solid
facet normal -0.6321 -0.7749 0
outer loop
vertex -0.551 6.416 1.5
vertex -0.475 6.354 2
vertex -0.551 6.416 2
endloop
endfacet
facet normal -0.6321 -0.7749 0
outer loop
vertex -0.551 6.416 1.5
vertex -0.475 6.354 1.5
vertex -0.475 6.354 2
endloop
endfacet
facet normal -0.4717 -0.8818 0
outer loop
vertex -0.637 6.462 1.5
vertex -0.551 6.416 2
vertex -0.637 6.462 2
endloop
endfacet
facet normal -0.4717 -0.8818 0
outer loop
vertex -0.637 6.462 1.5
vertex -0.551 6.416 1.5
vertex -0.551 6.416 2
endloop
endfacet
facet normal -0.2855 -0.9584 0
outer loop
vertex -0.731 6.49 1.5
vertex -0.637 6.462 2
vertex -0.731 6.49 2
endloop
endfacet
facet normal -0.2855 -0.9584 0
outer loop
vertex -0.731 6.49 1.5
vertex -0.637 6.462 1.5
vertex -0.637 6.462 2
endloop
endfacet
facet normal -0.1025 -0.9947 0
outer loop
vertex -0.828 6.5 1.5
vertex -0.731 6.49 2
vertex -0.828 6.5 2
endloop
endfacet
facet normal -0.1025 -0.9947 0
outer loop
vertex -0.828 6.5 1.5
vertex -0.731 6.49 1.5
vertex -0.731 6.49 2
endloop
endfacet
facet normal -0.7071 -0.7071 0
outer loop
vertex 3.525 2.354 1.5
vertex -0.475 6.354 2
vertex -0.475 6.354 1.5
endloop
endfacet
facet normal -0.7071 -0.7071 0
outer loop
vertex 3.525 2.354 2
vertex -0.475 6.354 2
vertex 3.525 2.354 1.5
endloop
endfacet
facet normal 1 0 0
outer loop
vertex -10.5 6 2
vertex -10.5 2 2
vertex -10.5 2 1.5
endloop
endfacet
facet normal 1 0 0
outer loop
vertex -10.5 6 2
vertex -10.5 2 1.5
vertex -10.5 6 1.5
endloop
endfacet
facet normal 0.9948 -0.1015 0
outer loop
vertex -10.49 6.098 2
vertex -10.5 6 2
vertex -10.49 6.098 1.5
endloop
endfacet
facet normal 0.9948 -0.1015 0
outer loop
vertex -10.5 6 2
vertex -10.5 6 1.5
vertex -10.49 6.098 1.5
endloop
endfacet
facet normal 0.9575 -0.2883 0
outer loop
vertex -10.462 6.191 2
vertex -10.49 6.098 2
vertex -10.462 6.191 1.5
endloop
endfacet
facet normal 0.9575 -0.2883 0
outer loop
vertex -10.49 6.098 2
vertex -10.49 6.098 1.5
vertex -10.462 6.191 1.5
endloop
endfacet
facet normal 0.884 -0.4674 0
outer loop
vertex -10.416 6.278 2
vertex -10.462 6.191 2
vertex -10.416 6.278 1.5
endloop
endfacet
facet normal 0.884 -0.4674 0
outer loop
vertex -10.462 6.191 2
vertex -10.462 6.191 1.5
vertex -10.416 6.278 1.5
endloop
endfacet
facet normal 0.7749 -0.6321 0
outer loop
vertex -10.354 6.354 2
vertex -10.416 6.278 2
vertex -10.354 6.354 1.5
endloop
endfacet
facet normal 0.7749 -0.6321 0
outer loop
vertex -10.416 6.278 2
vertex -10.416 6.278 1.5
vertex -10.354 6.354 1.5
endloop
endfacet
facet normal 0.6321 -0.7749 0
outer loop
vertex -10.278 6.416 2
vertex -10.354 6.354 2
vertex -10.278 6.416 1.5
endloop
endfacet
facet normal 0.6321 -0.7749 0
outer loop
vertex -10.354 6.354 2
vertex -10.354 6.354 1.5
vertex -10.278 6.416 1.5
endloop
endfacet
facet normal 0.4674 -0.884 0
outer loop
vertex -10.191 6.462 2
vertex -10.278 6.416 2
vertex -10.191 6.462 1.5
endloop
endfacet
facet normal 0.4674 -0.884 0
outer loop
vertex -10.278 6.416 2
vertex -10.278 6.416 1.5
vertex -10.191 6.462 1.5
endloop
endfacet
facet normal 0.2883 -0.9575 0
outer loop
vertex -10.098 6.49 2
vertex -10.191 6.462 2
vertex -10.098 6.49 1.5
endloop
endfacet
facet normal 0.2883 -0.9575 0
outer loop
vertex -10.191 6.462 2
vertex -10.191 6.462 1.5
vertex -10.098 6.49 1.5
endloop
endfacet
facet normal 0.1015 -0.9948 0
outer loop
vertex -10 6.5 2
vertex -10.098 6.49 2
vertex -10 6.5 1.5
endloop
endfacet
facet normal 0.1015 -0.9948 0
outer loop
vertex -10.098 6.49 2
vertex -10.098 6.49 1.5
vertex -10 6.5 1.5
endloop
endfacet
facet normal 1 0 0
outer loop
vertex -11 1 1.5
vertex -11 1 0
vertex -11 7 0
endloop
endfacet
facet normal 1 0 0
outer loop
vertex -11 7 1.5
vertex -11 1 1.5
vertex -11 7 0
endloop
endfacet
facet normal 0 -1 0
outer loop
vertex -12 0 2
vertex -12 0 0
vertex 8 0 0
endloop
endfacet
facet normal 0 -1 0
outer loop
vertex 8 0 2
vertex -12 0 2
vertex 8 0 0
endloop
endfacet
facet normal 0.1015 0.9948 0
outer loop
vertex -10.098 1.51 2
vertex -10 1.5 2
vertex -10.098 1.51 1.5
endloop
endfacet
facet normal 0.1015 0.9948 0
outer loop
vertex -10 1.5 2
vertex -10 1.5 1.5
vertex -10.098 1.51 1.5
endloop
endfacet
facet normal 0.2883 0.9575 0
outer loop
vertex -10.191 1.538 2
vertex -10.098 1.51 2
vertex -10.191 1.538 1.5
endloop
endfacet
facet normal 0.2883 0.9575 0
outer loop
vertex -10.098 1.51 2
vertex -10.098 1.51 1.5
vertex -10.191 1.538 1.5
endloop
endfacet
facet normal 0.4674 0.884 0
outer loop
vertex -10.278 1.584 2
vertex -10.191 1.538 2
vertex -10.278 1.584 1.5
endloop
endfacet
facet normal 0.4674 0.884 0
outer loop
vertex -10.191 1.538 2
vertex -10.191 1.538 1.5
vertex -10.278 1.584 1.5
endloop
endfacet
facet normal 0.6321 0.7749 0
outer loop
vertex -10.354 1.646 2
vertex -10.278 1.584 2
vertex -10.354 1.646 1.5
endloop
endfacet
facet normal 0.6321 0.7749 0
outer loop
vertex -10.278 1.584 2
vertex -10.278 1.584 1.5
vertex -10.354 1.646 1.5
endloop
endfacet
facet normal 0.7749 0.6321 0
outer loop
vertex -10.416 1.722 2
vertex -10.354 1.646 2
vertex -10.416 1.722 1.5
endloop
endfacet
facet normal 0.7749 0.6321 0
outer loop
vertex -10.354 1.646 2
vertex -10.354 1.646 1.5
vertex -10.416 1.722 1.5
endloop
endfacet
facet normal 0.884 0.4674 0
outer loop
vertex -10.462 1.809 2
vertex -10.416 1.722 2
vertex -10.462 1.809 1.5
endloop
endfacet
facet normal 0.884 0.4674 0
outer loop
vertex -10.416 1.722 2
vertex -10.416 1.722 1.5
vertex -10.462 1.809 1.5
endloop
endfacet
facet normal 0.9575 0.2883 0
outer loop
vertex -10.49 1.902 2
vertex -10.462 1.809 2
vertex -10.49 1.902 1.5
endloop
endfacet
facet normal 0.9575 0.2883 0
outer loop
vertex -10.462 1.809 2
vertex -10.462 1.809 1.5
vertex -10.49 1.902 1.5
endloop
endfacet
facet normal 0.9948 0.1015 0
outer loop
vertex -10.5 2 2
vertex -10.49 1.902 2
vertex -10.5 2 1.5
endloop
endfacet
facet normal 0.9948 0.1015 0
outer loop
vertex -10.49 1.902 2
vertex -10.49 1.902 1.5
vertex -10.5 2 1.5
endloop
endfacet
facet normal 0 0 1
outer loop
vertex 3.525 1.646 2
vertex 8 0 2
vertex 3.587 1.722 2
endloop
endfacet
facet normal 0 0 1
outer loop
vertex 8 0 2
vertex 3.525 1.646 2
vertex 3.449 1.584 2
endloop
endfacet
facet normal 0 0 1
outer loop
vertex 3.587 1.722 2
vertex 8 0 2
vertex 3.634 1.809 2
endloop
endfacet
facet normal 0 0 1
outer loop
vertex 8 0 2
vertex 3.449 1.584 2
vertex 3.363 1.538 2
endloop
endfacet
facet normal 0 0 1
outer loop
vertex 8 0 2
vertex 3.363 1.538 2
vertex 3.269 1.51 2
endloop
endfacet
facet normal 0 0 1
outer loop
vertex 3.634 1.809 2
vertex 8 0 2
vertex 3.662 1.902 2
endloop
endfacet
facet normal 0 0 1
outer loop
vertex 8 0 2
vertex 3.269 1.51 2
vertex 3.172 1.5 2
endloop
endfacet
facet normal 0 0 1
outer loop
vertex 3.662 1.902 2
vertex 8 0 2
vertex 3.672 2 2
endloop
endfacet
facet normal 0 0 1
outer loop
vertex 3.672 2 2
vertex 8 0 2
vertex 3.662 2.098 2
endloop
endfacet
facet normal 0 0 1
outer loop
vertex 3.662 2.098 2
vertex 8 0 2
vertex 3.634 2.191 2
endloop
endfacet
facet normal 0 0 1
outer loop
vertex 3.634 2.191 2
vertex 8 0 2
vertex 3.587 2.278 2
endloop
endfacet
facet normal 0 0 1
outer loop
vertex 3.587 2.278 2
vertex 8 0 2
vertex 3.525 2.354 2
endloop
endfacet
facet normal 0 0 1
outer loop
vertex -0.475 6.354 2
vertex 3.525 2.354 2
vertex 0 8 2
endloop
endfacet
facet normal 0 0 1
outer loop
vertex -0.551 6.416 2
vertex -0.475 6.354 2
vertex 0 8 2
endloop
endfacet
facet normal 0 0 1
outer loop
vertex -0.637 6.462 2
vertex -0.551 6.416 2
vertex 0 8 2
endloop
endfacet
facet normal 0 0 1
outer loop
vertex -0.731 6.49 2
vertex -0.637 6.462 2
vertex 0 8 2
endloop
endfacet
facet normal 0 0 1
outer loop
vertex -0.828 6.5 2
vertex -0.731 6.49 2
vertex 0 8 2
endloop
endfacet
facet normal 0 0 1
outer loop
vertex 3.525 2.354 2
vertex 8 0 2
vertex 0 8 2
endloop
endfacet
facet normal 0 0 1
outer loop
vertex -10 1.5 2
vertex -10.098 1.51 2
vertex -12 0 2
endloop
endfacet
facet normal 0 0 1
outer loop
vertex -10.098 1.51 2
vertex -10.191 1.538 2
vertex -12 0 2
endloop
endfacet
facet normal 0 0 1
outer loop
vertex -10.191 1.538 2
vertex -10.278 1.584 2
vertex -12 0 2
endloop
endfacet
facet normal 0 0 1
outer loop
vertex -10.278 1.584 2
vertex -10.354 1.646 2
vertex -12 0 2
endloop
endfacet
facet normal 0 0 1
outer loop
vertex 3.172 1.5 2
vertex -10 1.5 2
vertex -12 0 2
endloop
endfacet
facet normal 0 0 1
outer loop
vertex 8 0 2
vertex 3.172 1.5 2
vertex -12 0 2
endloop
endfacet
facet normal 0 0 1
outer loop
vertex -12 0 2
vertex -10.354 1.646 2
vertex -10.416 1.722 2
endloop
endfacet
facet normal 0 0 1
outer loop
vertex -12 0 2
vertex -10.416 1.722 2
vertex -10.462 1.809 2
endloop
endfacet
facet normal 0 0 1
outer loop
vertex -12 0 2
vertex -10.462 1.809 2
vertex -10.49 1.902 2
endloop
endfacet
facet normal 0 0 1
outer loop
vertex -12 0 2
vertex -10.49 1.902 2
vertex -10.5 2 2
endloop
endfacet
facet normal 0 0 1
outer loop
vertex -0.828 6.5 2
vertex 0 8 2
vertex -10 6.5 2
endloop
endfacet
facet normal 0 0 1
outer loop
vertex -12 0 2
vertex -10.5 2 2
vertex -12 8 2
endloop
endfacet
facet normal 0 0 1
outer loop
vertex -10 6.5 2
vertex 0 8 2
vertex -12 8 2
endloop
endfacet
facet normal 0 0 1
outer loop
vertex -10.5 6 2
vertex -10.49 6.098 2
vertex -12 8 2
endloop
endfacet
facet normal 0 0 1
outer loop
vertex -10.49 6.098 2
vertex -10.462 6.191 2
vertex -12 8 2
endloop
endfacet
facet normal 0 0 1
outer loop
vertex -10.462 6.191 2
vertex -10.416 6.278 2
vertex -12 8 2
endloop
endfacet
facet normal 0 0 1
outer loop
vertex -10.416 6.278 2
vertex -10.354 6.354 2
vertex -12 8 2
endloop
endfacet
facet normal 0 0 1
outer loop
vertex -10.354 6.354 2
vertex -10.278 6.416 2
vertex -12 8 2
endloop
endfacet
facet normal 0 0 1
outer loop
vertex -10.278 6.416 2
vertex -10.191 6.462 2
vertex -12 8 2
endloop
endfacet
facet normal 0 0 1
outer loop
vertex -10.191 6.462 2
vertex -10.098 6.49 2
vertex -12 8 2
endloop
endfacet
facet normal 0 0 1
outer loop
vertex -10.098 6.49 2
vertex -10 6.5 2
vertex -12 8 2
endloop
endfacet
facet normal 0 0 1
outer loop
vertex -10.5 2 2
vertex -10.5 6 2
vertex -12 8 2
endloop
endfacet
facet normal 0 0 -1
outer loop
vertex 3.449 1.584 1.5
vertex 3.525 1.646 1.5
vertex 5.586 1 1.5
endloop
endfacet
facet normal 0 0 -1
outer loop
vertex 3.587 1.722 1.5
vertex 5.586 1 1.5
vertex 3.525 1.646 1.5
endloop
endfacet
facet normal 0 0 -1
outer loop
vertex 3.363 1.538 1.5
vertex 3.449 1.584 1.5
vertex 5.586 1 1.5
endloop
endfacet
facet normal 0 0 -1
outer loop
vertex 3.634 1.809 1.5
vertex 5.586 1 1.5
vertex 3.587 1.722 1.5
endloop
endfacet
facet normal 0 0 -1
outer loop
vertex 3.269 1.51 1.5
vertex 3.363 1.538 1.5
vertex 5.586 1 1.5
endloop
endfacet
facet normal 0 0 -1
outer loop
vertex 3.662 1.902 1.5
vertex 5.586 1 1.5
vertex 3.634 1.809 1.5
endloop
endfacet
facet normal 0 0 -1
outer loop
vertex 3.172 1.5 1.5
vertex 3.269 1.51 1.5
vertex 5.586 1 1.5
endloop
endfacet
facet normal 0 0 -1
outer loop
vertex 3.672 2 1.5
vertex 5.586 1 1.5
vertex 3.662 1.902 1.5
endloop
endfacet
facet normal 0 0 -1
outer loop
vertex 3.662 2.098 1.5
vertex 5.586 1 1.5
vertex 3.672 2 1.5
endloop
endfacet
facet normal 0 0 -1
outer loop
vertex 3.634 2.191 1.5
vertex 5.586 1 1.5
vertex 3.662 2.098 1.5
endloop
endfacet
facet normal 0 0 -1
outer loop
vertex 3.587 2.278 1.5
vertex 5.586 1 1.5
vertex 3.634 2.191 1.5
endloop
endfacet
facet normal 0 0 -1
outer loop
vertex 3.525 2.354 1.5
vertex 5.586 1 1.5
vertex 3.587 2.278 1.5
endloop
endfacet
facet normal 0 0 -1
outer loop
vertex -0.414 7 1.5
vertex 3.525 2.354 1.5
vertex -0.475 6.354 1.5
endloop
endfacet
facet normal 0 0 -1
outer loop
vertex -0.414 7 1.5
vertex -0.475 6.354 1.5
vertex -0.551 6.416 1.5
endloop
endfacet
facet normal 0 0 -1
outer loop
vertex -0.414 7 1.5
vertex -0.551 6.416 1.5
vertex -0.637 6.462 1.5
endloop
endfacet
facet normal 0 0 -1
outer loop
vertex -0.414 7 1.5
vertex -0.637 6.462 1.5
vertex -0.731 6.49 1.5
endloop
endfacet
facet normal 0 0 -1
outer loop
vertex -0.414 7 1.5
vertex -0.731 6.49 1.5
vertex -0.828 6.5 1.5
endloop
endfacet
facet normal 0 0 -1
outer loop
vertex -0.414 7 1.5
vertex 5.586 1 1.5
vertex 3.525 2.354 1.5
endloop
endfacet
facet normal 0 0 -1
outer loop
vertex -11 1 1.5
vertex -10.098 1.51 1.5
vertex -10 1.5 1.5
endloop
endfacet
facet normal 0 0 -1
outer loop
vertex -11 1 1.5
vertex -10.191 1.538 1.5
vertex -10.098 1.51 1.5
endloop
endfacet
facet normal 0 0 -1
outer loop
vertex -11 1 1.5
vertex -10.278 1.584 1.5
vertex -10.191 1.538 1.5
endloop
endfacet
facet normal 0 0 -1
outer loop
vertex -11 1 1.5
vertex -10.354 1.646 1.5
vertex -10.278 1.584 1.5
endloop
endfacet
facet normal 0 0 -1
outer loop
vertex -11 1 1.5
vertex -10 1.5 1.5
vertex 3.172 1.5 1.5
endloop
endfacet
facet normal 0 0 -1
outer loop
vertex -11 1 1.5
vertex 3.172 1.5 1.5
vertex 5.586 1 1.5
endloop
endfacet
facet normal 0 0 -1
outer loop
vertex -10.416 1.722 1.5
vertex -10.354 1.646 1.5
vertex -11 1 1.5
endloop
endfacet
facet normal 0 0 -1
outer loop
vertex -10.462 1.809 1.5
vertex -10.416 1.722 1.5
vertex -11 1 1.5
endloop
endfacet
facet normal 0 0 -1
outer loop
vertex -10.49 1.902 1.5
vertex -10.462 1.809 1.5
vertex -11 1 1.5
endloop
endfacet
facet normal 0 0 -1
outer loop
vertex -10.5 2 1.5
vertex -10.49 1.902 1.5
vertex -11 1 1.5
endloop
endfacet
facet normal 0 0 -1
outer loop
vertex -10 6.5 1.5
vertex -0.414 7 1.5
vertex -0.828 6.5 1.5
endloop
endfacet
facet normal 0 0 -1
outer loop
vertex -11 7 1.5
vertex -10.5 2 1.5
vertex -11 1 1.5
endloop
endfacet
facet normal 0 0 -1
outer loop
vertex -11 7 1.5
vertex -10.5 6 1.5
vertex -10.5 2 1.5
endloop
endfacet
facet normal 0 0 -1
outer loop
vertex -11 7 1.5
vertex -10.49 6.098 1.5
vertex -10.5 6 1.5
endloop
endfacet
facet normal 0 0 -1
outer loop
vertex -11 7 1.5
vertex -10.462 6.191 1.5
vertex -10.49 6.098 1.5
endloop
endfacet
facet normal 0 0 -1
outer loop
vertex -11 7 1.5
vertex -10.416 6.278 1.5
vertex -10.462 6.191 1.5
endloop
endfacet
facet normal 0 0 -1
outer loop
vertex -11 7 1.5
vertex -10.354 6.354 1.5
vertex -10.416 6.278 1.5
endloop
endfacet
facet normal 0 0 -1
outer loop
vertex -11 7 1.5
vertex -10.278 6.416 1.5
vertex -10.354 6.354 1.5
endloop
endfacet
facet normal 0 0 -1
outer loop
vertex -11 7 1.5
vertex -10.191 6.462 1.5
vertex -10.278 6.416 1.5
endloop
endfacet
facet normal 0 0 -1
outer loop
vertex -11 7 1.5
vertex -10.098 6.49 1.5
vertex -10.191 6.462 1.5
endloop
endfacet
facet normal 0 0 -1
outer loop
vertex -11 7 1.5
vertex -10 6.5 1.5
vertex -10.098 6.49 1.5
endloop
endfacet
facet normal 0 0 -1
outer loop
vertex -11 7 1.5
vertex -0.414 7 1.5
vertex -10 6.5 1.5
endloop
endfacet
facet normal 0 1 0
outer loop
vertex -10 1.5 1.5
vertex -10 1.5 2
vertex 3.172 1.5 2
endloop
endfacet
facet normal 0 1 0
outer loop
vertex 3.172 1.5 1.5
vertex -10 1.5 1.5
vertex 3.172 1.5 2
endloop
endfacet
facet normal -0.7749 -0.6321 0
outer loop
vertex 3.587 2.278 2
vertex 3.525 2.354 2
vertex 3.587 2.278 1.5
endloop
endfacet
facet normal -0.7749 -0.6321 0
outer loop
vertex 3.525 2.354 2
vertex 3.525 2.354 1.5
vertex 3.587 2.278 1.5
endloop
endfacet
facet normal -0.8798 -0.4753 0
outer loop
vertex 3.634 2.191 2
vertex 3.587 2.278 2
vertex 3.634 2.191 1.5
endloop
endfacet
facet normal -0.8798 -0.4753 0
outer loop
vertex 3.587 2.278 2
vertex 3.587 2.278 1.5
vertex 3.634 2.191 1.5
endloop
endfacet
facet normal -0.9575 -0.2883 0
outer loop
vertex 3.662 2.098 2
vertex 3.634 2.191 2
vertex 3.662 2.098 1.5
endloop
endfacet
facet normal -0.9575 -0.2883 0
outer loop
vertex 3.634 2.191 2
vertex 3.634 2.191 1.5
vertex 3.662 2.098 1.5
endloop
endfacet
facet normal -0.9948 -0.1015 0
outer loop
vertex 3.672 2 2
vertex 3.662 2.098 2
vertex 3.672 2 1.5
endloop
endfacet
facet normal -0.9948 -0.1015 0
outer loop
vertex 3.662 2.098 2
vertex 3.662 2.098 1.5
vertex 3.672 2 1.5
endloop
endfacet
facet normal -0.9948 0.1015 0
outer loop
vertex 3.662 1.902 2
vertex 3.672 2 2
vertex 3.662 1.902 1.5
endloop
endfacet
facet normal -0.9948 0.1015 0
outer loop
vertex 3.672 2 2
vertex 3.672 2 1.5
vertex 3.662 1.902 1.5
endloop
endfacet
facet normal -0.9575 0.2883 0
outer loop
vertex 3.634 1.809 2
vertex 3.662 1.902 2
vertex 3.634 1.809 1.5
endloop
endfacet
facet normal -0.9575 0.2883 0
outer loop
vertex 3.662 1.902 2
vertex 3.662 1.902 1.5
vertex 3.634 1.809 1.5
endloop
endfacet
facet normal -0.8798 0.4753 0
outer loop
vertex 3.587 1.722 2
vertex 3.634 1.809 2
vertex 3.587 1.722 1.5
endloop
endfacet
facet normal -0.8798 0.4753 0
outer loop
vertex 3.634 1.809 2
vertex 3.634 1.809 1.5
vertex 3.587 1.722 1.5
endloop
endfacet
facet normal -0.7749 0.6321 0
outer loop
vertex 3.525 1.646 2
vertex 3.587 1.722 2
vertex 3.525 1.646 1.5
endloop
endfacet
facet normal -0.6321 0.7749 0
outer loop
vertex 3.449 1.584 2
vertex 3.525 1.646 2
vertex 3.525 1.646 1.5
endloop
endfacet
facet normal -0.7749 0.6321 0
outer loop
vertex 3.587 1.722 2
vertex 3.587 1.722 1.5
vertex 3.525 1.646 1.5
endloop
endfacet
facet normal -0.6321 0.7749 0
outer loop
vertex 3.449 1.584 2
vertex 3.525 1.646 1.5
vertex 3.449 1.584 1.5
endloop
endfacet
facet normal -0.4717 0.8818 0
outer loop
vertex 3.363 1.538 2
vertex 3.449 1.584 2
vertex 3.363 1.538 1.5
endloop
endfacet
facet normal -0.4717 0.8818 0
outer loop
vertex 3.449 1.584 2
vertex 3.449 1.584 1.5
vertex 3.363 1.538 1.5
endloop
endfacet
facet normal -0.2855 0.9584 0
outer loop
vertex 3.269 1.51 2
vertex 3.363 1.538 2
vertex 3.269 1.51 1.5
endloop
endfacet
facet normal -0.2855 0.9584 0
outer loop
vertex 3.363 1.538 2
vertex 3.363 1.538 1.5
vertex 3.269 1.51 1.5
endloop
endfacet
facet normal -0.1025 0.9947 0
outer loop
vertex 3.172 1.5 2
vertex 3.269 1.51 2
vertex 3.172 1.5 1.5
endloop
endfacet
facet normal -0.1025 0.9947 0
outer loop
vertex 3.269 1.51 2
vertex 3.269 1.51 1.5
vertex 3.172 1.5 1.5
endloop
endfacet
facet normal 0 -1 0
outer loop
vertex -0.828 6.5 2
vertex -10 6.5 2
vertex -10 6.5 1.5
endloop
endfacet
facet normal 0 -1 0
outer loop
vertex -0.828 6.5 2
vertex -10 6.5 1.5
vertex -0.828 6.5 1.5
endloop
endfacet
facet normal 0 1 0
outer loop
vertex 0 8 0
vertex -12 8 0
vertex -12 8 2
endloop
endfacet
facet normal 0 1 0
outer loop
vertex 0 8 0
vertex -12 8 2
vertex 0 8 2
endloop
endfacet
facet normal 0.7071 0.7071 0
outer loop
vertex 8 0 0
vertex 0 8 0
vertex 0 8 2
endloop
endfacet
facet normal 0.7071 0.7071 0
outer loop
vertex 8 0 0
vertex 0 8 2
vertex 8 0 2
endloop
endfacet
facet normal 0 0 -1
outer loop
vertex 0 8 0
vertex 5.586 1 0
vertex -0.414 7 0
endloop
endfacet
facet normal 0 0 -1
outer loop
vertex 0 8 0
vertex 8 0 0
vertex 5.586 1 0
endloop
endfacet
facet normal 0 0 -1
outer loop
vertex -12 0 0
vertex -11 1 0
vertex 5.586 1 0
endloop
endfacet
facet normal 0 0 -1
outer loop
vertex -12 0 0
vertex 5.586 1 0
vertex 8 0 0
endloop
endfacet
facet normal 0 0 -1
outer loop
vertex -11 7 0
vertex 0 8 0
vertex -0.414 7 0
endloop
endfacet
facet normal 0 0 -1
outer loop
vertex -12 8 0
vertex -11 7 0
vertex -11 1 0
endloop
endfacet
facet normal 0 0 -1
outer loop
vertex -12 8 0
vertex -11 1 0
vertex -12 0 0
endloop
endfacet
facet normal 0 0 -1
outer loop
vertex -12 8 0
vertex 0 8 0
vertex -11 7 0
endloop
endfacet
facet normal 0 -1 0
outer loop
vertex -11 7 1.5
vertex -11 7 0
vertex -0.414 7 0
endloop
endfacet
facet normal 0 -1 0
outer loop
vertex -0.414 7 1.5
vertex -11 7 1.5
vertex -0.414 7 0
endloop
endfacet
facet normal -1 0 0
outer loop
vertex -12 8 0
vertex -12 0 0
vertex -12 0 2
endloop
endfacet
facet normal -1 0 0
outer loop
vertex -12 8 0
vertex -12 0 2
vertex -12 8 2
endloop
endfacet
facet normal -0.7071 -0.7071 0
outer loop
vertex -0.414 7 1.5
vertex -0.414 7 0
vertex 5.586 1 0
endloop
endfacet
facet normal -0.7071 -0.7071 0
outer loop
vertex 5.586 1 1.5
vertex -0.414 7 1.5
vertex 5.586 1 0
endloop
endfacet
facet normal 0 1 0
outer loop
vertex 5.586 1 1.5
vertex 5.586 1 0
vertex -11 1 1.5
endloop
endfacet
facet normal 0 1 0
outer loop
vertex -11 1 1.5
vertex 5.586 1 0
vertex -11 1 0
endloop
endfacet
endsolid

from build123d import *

# Parameters (mm, degrees)
BOSS_EXTRUDE1_DEPTH = 2
CUT_EXTRUDE1_DEPTH  = 15.560219779
CUT_EXTRUDE2_DEPTH  = 1.5
FILLET1_R           = 0.5


with BuildPart() as part:
    # Sketch1 → Boss-Extrude1 (new body)
    with BuildSketch(Plane.XY):
        Polygon((0, 8), (8, 0), (0, 0), (-12, 0), (-12, 8), align=None)
    extrude(amount=BOSS_EXTRUDE1_DEPTH)

    # Sketch2 → Cut-Extrude1 (cut, through all)
    with BuildSketch(Plane.XY.offset(2)):
        Polygon((-0.621320344, 6.5), (4.378679656, 1.5), (-0.621320344, 1.5), (-10.5, 1.5), (-10.5, 6.5), align=None)
    extrude(amount=-CUT_EXTRUDE1_DEPTH, mode=Mode.SUBTRACT)

    # Sketch3 → Cut-Extrude2 (cut)
    with BuildSketch(Plane(origin=(0, 0, 0), x_dir=(-1, 0, 0), z_dir=(0, 0, -1))):
        Polygon((0.414213562, 7), (-5.585786438, 1), (0.414213562, 1), (11, 1), (11, 7), align=None)
    extrude(amount=-CUT_EXTRUDE2_DEPTH, mode=Mode.SUBTRACT)

    # Fillet1
    fillet1_edges = [part.edges().sort_by_distance(p)[0] for p in [
        (4.378679656, 1.5, 1.75),
        (-10.5, 1.5, 1.75),
        (-0.621320344, 6.5, 1.75),
        (-10.5, 6.5, 1.75),
    ]]
    fillet(fillet1_edges, radius=FILLET1_R)


solid = part.part
